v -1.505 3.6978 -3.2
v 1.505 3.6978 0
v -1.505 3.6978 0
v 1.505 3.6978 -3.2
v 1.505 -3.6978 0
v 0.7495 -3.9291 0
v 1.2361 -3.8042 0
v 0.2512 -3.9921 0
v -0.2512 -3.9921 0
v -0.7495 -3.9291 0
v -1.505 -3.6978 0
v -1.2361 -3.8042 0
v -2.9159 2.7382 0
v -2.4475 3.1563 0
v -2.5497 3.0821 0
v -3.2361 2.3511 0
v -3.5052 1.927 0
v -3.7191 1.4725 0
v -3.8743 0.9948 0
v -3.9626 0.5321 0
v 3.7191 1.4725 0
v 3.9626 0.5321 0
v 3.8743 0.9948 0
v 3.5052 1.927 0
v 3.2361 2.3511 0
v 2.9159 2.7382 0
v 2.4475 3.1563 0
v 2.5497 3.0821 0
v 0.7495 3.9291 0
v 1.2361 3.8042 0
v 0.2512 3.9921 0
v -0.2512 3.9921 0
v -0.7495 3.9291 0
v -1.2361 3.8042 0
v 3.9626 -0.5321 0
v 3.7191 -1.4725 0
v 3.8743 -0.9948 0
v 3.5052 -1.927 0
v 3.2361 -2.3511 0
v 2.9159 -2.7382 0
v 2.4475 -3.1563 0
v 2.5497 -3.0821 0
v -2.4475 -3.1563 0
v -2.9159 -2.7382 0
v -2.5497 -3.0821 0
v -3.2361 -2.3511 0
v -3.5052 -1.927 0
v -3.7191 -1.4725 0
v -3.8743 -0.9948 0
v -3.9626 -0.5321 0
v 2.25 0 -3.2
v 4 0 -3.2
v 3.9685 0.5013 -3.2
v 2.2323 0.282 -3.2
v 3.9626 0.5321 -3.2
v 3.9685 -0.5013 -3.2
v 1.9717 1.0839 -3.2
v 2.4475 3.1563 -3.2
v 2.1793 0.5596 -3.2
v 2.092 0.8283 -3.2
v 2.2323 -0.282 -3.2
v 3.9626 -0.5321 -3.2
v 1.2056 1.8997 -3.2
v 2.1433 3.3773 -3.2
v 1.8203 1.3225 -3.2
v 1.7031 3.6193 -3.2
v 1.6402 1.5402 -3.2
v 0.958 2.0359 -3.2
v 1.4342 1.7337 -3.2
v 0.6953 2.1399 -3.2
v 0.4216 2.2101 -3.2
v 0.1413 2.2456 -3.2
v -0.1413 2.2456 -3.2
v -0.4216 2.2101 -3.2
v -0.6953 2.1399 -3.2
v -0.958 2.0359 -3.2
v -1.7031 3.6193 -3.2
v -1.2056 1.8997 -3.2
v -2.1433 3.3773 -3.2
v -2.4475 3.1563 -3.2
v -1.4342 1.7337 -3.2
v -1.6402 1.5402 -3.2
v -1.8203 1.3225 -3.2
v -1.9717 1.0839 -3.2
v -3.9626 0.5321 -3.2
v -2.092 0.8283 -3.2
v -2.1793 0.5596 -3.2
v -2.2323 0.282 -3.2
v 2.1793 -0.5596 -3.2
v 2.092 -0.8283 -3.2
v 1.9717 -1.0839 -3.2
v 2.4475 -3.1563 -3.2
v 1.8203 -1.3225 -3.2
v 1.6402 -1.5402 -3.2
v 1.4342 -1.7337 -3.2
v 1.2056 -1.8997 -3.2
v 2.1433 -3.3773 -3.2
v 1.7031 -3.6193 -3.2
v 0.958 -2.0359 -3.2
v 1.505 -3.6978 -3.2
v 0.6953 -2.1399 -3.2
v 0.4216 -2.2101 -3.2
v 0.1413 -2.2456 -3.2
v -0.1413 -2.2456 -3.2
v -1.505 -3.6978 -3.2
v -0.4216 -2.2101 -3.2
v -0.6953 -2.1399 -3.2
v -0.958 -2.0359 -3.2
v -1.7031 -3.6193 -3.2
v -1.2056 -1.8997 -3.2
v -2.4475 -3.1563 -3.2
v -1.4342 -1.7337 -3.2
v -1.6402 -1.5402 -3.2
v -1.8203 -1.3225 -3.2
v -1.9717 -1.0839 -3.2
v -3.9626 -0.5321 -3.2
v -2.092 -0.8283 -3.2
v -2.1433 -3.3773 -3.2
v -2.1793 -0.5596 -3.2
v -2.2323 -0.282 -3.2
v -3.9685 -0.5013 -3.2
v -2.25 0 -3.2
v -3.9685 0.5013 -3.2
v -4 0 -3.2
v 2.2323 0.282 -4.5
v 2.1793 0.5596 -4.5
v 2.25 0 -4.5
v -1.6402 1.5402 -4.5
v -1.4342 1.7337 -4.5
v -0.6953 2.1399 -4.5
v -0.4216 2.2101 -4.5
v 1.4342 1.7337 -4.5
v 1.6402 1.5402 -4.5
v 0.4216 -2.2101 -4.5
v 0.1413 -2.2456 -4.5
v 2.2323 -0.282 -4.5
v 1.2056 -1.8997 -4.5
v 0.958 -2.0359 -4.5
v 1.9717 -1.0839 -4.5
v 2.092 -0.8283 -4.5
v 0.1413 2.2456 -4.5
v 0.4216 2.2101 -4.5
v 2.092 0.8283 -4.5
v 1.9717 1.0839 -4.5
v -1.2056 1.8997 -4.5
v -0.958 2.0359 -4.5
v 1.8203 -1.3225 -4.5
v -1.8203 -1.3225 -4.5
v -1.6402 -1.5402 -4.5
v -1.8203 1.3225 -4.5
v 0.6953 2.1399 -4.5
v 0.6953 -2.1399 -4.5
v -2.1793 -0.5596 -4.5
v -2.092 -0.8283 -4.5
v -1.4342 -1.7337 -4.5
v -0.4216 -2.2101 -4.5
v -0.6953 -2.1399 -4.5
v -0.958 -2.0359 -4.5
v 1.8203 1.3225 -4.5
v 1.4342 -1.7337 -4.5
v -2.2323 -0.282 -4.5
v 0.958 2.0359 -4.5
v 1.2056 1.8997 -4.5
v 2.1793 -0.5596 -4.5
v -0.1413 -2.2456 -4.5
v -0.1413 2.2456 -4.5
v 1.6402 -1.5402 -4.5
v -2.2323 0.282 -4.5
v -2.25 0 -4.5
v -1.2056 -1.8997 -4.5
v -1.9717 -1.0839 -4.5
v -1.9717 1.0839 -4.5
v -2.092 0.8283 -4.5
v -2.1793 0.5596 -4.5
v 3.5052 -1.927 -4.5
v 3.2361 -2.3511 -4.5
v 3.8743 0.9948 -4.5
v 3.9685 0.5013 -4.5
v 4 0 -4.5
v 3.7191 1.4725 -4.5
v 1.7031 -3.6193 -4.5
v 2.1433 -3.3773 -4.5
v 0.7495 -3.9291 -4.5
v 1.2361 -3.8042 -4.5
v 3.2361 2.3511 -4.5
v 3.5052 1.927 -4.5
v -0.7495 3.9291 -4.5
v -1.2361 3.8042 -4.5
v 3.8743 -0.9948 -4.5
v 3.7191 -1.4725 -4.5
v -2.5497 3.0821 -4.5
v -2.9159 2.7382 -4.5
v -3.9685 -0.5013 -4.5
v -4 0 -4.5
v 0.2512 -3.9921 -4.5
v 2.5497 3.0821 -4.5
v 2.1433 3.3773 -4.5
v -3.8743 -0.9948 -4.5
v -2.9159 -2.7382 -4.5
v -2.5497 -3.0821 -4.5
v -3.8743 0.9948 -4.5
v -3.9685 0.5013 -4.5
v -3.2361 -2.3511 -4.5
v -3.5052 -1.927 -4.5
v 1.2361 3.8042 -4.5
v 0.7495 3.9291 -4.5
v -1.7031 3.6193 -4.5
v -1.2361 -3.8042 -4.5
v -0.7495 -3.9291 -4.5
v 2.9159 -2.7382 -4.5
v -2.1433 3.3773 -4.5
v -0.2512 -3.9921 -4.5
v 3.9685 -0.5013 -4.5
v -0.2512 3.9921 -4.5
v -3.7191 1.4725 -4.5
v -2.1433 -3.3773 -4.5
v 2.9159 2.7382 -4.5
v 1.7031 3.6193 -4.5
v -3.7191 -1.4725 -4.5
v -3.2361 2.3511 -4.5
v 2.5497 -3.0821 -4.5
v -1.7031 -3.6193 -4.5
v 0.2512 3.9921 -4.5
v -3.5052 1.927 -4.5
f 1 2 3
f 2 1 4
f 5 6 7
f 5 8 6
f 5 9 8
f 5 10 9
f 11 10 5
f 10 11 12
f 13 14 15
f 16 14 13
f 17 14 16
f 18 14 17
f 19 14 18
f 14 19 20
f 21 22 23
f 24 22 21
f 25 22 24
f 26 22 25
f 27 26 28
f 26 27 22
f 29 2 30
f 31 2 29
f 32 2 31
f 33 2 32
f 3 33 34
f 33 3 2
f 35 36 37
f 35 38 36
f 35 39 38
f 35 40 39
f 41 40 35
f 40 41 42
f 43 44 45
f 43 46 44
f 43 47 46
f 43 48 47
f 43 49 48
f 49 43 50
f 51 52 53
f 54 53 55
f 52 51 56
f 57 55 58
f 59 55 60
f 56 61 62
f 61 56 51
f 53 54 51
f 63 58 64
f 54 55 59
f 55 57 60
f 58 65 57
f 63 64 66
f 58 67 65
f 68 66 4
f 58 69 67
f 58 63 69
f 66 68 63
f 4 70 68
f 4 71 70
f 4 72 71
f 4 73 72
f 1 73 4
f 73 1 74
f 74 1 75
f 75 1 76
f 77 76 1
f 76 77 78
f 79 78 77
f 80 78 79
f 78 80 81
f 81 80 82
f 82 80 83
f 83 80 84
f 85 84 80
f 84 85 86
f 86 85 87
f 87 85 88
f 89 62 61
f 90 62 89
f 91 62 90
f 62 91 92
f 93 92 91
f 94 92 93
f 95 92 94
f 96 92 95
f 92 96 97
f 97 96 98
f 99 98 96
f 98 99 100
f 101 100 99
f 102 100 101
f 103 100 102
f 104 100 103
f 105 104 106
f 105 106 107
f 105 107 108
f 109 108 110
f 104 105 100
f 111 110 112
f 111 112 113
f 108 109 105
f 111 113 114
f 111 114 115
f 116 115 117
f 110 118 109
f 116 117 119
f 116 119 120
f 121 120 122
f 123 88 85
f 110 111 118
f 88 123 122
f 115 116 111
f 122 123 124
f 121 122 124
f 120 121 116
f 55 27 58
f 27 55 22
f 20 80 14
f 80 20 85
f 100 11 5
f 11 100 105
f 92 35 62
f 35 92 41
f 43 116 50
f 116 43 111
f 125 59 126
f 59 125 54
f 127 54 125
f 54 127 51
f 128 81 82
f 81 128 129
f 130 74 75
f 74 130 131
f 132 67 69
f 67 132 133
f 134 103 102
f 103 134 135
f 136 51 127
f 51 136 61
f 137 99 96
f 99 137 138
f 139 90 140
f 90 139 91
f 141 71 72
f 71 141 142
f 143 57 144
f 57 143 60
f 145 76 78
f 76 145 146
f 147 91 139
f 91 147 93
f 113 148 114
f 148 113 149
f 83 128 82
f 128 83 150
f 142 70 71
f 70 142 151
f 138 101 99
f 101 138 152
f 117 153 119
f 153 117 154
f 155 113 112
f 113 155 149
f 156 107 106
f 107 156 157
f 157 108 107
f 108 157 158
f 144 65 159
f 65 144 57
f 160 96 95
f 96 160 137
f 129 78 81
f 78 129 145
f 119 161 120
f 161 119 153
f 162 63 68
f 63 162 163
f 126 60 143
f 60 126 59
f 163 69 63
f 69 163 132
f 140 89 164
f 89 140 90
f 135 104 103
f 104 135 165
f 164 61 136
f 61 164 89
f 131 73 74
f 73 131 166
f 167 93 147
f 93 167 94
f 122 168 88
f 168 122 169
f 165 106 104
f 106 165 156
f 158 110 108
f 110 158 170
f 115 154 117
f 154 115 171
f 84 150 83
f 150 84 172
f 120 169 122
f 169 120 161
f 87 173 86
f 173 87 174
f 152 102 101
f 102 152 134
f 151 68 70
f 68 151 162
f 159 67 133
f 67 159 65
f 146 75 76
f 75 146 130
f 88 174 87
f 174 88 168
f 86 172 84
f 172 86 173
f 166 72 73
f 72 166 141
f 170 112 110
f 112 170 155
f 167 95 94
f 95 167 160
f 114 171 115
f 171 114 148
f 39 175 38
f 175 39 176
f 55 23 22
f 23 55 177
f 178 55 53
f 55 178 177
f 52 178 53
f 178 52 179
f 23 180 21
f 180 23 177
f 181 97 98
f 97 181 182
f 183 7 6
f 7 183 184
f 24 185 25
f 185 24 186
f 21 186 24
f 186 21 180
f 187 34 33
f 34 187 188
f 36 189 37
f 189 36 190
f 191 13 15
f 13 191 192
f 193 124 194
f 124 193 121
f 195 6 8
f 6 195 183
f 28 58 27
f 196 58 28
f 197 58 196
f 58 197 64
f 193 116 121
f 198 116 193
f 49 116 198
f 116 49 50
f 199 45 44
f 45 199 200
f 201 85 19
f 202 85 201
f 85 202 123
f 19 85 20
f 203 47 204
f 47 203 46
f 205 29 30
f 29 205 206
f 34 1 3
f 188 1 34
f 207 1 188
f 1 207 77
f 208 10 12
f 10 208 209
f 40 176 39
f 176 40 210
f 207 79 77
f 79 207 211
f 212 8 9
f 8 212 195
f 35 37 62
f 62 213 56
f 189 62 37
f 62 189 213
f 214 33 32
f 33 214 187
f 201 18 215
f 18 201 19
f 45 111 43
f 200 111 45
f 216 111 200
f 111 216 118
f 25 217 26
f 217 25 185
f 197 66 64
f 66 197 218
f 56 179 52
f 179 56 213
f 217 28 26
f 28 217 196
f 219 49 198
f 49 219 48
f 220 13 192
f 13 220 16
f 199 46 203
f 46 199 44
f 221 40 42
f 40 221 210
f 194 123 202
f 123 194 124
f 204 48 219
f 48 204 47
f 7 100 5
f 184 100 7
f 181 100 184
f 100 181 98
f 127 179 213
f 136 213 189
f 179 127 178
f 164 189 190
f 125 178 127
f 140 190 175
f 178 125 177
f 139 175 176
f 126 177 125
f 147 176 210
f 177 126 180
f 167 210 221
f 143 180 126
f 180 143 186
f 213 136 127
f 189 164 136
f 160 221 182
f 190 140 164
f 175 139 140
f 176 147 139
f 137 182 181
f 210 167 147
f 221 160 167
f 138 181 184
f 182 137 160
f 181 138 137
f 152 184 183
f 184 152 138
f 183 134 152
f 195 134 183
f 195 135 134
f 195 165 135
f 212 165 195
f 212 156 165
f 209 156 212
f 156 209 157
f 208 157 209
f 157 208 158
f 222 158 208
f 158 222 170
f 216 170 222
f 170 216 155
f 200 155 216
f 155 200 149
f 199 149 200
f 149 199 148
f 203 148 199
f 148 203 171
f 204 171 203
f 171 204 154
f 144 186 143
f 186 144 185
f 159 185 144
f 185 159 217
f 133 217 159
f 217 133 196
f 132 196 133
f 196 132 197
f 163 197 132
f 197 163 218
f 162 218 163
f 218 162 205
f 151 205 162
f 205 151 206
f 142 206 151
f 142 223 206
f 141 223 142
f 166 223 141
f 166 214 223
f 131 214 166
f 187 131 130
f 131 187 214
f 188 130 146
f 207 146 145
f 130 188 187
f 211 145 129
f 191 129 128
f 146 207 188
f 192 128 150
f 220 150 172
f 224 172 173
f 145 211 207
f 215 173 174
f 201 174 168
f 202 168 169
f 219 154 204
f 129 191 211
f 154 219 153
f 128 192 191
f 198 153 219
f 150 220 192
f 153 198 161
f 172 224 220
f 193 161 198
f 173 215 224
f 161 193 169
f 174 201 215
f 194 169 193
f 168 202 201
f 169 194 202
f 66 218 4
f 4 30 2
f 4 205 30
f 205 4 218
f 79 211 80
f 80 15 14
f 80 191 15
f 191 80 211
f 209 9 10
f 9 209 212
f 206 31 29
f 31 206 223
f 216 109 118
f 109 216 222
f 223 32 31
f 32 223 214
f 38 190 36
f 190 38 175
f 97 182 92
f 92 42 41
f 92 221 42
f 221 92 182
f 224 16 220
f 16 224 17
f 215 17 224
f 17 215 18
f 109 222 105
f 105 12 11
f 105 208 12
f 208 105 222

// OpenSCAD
$fn = 50;

difference() {
	union() {
		translate(v = [0, 0, -4.5]) {
			cylinder(h = 4.5, r = 4.0);
		}
	}
	union() {
		translate(v = [0, 0, 0]) {
			rotate(a = [0, 0, 0]) {
				difference() {
					union() {
						translate(v = [0, 0, -3.2]) {
							linear_extrude(height = 3.2) {
								polygon(points = [[4.2698, 0.0], [2.1349000000000005, 3.697755269078796], [-2.134899999999999, 3.6977552690787965], [-4.2698, 5.228996902999369e-16], [-2.134900000000002, -3.6977552690787956], [2.1348999999999974, -3.697755269078798]]);
							}
						}
					}
					union();
				}
			}
		}
		#translate(v = [0, 0, -100.0]) {
			cylinder(h = 200, r = 2.25);
		}
	}
}
